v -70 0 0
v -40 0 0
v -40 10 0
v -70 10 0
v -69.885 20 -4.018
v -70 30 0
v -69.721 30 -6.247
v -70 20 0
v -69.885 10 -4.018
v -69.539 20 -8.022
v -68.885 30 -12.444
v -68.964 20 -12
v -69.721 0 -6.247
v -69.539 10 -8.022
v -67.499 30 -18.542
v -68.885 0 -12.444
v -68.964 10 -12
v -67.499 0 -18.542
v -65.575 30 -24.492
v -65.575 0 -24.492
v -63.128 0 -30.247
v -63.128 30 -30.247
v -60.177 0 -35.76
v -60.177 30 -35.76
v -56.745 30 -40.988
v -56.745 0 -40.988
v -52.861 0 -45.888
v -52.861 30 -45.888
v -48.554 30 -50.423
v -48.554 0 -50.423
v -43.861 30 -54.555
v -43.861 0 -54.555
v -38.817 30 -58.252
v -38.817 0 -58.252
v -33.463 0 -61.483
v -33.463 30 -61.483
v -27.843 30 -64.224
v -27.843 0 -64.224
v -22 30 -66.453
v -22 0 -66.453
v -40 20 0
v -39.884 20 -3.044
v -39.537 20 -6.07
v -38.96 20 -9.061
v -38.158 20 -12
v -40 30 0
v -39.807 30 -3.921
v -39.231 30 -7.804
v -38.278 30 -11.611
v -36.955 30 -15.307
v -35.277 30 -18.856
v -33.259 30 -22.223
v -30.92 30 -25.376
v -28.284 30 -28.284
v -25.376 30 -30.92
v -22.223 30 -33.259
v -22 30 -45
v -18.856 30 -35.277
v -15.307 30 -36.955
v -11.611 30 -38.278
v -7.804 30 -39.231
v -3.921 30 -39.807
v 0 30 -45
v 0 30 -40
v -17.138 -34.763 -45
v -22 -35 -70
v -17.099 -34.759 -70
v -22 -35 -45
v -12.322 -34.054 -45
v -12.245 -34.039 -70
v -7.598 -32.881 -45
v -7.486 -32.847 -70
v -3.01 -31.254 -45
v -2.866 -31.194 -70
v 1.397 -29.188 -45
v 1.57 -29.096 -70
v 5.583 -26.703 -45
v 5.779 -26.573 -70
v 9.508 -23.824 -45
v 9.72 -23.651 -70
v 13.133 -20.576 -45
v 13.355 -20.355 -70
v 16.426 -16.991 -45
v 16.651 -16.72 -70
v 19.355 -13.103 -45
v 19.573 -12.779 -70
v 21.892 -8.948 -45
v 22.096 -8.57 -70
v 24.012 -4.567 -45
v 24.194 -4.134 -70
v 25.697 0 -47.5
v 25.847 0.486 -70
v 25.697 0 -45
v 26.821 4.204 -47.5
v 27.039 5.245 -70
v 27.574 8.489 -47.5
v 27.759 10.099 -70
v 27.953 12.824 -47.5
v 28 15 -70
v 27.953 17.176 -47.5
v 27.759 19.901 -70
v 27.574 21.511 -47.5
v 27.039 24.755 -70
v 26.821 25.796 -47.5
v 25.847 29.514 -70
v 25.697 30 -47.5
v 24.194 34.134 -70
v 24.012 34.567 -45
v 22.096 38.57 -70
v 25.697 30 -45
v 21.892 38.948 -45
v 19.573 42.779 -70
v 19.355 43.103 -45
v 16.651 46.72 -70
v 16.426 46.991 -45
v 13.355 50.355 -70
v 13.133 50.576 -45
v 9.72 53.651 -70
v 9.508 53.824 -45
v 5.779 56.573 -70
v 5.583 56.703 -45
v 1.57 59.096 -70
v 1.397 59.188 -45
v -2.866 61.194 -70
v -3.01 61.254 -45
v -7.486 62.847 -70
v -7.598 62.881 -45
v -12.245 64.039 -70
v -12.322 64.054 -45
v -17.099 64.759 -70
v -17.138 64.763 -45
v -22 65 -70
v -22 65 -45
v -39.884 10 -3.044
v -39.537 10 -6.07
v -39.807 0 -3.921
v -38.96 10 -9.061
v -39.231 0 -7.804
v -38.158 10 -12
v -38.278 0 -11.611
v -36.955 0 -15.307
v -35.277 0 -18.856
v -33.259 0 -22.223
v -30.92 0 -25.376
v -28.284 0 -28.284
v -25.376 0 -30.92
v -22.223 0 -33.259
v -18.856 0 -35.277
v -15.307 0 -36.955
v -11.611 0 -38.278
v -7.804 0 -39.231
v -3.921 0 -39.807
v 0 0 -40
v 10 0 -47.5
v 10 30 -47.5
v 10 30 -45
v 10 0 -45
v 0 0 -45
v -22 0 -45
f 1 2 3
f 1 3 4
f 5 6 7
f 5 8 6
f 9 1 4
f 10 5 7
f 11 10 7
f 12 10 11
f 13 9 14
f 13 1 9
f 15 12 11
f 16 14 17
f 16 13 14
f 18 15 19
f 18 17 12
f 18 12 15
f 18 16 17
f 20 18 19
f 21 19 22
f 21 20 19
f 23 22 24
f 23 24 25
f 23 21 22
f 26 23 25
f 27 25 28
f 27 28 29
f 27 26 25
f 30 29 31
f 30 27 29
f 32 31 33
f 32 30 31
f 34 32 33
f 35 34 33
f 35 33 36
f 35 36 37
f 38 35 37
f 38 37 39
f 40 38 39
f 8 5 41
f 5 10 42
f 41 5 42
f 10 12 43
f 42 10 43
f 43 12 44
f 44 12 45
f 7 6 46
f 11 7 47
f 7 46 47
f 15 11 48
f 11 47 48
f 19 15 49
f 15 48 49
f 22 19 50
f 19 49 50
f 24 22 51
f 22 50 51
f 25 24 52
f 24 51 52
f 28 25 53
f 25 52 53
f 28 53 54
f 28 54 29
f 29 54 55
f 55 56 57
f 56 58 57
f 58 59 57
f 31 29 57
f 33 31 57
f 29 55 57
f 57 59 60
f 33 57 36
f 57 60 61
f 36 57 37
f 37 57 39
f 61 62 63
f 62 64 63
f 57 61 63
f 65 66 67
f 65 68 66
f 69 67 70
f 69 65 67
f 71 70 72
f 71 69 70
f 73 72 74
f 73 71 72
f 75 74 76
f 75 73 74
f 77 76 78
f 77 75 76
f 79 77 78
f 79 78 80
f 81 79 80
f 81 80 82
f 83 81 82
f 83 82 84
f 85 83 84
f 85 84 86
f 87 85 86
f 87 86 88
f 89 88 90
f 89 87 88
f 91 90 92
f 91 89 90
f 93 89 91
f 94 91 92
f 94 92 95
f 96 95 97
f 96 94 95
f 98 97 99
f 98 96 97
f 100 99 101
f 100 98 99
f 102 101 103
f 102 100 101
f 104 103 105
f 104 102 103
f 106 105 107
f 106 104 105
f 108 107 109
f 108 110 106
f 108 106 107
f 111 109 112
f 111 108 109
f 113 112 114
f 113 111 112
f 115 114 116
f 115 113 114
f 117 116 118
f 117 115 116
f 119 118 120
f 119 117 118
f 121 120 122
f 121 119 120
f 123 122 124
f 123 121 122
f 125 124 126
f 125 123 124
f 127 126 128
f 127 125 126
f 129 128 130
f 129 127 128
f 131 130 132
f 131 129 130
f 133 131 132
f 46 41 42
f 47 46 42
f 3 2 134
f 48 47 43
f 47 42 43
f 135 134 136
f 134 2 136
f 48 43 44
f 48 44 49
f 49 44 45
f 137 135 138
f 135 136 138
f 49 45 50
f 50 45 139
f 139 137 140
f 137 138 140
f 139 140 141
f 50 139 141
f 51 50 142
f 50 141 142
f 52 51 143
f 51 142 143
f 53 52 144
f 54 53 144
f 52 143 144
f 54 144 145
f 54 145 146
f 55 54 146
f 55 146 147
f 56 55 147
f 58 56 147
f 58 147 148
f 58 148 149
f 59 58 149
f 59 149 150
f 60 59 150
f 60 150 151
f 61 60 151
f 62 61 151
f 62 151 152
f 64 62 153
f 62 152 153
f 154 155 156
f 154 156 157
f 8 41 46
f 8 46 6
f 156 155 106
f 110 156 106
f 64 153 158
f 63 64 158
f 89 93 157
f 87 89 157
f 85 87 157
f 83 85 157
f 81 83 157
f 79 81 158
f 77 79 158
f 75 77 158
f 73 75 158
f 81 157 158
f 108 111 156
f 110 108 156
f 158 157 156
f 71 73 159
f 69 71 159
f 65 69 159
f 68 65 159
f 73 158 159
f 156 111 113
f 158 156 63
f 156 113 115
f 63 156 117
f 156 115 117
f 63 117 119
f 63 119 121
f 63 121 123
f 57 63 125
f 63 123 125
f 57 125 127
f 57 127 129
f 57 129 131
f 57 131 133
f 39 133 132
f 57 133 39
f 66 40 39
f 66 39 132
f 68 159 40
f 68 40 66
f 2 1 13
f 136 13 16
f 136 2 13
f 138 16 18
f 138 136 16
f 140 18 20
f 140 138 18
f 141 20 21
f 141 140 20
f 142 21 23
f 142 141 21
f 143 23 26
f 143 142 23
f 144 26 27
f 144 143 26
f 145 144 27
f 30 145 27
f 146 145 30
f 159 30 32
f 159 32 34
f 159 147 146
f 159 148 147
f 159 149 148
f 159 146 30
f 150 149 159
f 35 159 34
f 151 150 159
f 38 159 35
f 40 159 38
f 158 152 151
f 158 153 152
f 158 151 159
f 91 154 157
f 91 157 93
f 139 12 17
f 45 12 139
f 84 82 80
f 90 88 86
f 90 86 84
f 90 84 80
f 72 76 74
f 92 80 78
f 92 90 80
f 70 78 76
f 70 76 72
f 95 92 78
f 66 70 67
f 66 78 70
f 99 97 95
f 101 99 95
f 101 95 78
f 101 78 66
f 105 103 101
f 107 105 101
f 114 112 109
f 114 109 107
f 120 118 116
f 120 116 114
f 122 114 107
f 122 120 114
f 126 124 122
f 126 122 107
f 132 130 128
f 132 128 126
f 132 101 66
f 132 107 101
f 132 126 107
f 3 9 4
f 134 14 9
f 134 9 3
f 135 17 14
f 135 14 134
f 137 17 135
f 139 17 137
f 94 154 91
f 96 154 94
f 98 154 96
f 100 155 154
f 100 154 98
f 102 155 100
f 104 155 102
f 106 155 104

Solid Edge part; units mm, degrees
sketch "Sketch1" plane through (0, 0, 0) normal (0, -1, 0) x (1, 0, 0)
  line L0 (-40, 0) -> (-70, 0)
  arc A0 (-70, 0) -> (0, -70) centre (0, 0) ccw
  line L1 (0, -40) -> (0, -70)
  arc A1 (-40, 0) -> (0, -40) centre (0, 0) ccw
extrude "Protrusion1" add sketch "Sketch1" against normal blind 30
sketch "Sketch2" plane through (-55, 15, 0) normal (0, 0, 1) x (1, 0, 0)
  line L0 (15, 5) -> (-15, 5)
  line L1 (-15, 5) -> (-15, -5)
  line L2 (-15, -5) -> (15, -5)
extrude "ExtrudedCutout_1" cut sketch "Sketch2" along normal mid plane 24 material side at (-55, 19.95, 0)
sketch "Sketch3" plane through (0, 0, -45) normal (0, 0, 1) x (1, 0, 0)
  arc A0 (-22, 65) -> (-22, -35) centre (-22, 15) cw
  line L0 (-22, 65) -> (-22, -35)
extrude "ExtrudedProtrusion_2" add sketch "Sketch3" against normal blind 25
sketch "Sketch4" plane through (0, 0, -45) normal (0, 0, 1) x (1, 0, 0)
  line L0 (25.697, 0) -> (10, 0)
  line L1 (10, 30) -> (10, 0)
  line L2 (10, 30) -> (25.697, 30)
extrude "ExtrudedCutout_2" cut sketch "Sketch4" along normal mid plane 5 material side at (17.8485, 0.05, -45)
